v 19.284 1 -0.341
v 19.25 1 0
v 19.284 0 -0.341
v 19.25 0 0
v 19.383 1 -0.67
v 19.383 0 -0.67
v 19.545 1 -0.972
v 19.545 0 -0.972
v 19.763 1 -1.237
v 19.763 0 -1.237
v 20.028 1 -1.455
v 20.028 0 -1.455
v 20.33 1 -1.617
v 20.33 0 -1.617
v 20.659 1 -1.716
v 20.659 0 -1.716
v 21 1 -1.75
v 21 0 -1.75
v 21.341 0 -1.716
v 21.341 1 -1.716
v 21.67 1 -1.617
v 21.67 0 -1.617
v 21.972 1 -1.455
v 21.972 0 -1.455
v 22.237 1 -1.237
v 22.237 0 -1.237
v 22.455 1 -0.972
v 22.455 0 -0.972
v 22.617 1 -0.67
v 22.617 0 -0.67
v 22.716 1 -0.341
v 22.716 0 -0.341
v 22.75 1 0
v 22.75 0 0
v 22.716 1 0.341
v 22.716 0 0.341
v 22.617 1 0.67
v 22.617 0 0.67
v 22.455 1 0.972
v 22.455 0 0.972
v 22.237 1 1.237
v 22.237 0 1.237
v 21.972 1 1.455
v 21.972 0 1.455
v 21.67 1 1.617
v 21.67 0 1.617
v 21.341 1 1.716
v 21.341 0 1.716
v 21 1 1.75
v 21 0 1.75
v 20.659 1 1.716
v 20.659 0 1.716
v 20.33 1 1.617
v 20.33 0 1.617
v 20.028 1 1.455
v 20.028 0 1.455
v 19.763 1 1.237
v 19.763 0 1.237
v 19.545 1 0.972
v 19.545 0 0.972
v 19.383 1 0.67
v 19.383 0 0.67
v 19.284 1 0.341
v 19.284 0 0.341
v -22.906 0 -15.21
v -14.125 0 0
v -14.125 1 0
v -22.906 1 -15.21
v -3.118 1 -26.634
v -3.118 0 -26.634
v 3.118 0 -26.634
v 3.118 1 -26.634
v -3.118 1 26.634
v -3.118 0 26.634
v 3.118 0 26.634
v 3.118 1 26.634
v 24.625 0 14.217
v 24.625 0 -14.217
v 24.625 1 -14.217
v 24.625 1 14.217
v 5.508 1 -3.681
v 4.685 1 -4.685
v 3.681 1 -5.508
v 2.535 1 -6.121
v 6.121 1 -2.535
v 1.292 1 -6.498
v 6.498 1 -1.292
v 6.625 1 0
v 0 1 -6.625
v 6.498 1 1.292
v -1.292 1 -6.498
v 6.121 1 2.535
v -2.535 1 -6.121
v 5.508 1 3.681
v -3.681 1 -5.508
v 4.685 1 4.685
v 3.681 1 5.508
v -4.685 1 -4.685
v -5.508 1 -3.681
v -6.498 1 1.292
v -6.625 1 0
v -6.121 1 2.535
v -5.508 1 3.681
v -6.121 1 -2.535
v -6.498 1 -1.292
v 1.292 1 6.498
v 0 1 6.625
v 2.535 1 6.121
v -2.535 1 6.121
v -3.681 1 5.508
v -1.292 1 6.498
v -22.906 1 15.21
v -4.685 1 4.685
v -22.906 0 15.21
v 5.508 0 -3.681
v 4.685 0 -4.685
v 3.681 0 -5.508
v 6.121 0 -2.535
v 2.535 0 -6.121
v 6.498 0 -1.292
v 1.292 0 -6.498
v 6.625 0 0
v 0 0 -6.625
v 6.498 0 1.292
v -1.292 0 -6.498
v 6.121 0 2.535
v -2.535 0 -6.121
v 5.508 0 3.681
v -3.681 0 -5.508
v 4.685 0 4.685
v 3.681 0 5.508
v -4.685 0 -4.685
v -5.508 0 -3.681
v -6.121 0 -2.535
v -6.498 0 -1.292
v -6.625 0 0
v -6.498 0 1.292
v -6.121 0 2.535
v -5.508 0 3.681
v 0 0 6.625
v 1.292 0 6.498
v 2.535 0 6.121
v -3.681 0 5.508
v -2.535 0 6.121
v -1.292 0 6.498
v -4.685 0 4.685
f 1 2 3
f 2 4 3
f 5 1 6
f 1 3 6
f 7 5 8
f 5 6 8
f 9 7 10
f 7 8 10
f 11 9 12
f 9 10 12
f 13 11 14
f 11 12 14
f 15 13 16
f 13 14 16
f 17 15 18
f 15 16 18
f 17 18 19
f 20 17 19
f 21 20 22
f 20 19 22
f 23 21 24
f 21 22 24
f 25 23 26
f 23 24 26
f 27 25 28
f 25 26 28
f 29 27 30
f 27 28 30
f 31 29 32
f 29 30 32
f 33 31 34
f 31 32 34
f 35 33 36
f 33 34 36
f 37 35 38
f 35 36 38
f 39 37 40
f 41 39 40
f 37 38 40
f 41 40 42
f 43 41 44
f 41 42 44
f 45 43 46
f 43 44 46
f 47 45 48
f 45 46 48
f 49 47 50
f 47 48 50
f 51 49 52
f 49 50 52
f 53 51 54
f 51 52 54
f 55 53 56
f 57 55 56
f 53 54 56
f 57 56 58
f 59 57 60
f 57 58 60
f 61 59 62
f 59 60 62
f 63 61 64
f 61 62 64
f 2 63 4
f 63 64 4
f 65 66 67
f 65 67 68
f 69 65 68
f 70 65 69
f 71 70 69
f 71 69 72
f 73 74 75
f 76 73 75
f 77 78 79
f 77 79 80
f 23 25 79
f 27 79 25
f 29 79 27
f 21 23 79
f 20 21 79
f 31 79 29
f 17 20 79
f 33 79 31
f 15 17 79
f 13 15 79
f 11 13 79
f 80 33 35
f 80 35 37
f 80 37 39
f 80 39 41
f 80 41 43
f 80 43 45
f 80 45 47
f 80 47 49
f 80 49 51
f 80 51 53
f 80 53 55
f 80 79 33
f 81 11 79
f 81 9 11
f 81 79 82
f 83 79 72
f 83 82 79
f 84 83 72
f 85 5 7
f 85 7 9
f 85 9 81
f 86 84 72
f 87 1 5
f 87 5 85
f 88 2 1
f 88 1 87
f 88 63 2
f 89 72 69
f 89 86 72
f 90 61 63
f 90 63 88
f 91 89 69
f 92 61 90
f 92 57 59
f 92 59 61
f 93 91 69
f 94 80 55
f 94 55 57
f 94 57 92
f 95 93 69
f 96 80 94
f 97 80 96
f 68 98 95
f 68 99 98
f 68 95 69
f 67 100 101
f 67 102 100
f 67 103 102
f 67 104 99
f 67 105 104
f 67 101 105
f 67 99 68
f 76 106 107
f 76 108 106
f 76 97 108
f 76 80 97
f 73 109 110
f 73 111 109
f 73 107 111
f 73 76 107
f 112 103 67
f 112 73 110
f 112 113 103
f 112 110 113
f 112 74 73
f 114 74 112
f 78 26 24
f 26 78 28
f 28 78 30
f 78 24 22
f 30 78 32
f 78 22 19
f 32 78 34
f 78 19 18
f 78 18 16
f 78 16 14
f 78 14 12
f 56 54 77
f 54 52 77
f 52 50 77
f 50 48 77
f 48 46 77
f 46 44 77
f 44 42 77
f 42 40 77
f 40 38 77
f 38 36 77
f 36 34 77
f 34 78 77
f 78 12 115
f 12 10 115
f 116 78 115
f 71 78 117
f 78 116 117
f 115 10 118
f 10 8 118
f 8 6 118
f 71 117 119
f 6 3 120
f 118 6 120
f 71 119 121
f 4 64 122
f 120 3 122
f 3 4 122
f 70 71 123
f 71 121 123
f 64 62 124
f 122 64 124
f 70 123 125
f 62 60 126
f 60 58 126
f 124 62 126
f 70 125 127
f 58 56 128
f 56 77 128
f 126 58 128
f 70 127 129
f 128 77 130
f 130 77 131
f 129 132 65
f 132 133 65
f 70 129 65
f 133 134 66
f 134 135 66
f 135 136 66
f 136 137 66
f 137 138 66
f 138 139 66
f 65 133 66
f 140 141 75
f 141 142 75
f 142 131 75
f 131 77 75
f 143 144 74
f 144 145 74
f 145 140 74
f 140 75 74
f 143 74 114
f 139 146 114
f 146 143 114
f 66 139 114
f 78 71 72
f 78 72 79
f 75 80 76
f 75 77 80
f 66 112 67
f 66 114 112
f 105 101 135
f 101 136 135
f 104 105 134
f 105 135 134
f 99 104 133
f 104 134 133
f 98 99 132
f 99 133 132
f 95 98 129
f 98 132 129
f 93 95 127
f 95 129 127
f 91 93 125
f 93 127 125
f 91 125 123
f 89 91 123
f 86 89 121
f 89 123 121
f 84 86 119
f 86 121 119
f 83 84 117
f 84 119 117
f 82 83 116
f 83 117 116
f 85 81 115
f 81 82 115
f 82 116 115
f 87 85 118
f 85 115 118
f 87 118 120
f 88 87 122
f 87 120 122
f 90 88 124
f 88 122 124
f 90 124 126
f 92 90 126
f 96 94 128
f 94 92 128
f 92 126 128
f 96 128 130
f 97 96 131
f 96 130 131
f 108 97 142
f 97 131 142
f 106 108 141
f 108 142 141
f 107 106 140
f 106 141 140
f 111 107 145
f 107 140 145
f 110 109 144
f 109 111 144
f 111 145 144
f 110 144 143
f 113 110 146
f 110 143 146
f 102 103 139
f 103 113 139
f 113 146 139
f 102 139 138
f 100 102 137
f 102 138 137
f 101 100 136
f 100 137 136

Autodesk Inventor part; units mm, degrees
ref_plane "YZ Plane" through (0, 0, 0) normal (1, 0, 0) x (0, 1, 0)
ref_plane "XZ Plane" through (0, 0, 0) normal (0, 1, 0) x (-1, 0, 0)
ref_plane "XY Plane" through (0, 0, 0) normal (0, 0, 1) x (1, 0, 0)
sketch "Sketch1" plane through (0, 0, 0) normal (0, 1, 0) x (-1, 0, 0)
  circle A0 centre (0, 0) radius 6.625
  line L0 (0, -28.4345) -> (-24.625, -14.2173)
  line L1 (-24.625, -14.2173) -> (-24.625, 14.2173)
  line L2 (-24.625, 14.2173) -> (0, 28.4345)
  line L3 (0, 28.4345) -> (24.625, 14.2173)
  line L4 (24.625, 14.2173) -> (24.625, -14.2173)
  line L5 (24.625, -14.2173) -> (0, -28.4345)
  line L6 (22.9063, 15.2096) -> (14.125, 0)
  line L7 (14.125, 0) -> (22.9062, -15.2096)
  line L8 (14.125, 0) -> (24.625, 0)
  line L9 (3.1177, 26.6345) -> (-3.1177, 26.6345)
  line L10 (3.1177, -26.6345) -> (-3.1177, -26.6345)
  circle A1 centre (-21, 0) radius 1.75
  line L11 (0, 0) -> (-21, 0)
  dimension "d0" = 13.25
  dimension "d1" = 49.25
  dimension "d4" = 120
  dimension "d5" = 120
  dimension "d6" = 10.5
  dimension "d7" = 24.625
  dimension "d8" = 1.8
  dimension "d9" = 1.8
  dimension "d10" = 3.5
  dimension "d11" = 21
extrude "Extrusion1" add sketch "Sketch1" along normal blind 1 contours A1 | L0 L1 L2 L9 L3 L6 L7 L5 L10
extrude "Extrusion2" cut sketch "Sketch1" along normal through all contours A1
properties part number "PCB"
